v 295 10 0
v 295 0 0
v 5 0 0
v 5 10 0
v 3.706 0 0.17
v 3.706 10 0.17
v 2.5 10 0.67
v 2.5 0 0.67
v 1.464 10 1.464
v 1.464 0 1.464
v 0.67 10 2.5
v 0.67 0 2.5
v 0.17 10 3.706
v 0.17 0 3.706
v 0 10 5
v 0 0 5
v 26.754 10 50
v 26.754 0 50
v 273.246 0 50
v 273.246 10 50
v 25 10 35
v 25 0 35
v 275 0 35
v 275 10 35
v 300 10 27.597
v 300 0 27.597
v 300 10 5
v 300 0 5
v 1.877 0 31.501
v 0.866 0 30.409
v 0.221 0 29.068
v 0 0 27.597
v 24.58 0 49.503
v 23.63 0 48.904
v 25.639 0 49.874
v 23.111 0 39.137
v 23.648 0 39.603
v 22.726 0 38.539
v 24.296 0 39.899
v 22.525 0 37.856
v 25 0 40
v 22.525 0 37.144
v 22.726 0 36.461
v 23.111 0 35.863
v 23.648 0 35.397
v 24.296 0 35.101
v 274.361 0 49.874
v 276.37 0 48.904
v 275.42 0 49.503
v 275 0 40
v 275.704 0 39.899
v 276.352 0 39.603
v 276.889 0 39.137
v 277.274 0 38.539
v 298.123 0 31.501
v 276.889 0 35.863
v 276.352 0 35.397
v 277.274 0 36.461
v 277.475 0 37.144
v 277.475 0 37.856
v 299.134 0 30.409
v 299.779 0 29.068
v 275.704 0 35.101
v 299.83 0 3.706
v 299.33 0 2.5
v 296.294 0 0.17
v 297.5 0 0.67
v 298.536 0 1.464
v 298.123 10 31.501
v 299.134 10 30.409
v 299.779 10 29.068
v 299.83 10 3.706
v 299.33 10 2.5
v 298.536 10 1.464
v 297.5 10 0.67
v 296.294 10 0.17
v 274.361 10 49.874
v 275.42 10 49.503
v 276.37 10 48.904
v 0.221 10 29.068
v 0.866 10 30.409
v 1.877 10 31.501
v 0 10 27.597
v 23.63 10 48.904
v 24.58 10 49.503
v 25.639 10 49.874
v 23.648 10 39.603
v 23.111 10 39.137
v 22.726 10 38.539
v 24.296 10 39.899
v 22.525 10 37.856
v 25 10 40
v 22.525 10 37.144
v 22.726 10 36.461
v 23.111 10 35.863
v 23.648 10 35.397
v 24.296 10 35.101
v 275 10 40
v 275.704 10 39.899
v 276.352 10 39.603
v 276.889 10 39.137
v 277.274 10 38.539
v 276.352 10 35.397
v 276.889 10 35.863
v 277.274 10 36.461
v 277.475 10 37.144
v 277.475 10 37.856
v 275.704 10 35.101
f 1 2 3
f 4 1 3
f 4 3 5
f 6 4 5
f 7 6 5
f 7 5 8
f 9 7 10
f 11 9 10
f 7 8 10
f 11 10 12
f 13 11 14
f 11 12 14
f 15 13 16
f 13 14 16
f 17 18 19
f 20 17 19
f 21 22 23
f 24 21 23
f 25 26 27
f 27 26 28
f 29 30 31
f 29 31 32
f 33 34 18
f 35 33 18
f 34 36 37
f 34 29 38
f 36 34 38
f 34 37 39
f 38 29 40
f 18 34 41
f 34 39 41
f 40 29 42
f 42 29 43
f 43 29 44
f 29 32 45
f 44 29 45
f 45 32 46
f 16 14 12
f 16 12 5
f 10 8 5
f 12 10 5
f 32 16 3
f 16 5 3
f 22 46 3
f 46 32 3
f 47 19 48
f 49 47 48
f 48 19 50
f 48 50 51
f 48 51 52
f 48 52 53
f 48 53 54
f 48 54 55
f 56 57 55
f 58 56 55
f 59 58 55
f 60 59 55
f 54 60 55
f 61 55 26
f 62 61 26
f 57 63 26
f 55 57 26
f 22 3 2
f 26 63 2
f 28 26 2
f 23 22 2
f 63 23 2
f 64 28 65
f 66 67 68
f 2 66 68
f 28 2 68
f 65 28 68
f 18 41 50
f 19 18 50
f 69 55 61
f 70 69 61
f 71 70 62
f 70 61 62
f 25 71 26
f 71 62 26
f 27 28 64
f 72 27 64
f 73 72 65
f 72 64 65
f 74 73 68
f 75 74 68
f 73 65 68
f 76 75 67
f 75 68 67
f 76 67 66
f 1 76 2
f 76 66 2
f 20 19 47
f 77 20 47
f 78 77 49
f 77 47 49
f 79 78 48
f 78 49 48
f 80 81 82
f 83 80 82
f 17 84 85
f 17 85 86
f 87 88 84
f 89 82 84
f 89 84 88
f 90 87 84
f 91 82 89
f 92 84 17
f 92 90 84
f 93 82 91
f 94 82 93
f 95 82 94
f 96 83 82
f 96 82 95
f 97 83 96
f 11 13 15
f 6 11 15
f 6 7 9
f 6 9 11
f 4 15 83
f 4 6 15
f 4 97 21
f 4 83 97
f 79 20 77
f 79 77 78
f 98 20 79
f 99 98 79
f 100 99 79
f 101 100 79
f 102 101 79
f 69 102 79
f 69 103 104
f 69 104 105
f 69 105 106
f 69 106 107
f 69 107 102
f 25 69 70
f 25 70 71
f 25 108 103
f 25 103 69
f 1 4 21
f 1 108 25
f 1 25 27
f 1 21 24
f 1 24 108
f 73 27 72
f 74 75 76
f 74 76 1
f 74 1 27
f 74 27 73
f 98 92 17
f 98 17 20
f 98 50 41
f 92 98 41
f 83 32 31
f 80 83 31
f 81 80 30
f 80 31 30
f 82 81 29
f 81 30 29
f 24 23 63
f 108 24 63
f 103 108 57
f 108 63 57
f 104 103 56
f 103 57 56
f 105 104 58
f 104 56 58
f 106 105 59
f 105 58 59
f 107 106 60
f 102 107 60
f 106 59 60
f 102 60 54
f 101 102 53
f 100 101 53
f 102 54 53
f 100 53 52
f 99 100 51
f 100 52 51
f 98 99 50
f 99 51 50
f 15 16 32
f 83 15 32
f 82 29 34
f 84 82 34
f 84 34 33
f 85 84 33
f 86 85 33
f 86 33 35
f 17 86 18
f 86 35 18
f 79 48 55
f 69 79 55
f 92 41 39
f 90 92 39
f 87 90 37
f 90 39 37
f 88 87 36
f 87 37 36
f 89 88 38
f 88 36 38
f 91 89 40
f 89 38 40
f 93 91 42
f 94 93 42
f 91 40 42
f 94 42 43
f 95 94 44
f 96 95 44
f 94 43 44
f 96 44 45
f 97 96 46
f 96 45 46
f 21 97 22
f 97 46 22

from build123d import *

# Parameters (mm, degrees)
BOSS_EXTRUDE1_DEPTH     = 10
CUT_EXTRUDE4_DEPTH      = 305.302481094
CUT_EXTRUDE4_DEPTH_BACK = 305.302481094


with BuildPart() as part:
    # Sketch1 → Boss-Extrude1 (new body)
    with BuildSketch(Plane(origin=(0, 0, 0), x_dir=(1, 0, 0), z_dir=(0, 1, 0))):
        with BuildLine():
            Line((0, -5), (0, -27.596875763))
            ThreePointArc((0, -27.596875763), (0.493483818, -29.762819415), (1.876524762, -31.50121981))
            Line((1.876524762, -31.50121981), (23.630430059, -48.904344047))
            ThreePointArc((23.630430059, -48.904344047), (25.09887059, -49.718141596), (26.753905297, -50))
            Line((26.753905297, -50), (273.246094703, -50))
            ThreePointArc((273.246094703, -50), (274.90112941, -49.718141596), (276.369569941, -48.904344047))
            Line((276.369569941, -48.904344047), (298.123475238, -31.50121981))
            ThreePointArc((298.123475238, -31.50121981), (299.506516182, -29.762819415), (300, -27.596875763))
            Line((300, -27.596875763), (300, -5))
            ThreePointArc((300, -5), (298.535533906, -1.464466094), (295, 0))
            Line((295, 0), (5, 0))
            ThreePointArc((5, 0), (1.464466094, -1.464466094), (0, -5))
        make_face()
    extrude(amount=BOSS_EXTRUDE1_DEPTH)

    # Sketch2 → Cut-Extrude4 (cut, two sides: drawn at the far end of the back side and taken through both)
    with BuildSketch(Plane(origin=(0, 0, 0), x_dir=(1, 0, 0), z_dir=(0, 1, 0)).offset(-CUT_EXTRUDE4_DEPTH_BACK)):
        with BuildLine():
            Line((25, -35), (275, -35))
            ThreePointArc((275, -35), (277.5, -37.5), (275, -40))
            Line((275, -40), (25, -40))
            ThreePointArc((25, -40), (22.5, -37.5), (25, -35))
        make_face()
    extrude(amount=CUT_EXTRUDE4_DEPTH + CUT_EXTRUDE4_DEPTH_BACK, mode=Mode.SUBTRACT)


solid = part.part
